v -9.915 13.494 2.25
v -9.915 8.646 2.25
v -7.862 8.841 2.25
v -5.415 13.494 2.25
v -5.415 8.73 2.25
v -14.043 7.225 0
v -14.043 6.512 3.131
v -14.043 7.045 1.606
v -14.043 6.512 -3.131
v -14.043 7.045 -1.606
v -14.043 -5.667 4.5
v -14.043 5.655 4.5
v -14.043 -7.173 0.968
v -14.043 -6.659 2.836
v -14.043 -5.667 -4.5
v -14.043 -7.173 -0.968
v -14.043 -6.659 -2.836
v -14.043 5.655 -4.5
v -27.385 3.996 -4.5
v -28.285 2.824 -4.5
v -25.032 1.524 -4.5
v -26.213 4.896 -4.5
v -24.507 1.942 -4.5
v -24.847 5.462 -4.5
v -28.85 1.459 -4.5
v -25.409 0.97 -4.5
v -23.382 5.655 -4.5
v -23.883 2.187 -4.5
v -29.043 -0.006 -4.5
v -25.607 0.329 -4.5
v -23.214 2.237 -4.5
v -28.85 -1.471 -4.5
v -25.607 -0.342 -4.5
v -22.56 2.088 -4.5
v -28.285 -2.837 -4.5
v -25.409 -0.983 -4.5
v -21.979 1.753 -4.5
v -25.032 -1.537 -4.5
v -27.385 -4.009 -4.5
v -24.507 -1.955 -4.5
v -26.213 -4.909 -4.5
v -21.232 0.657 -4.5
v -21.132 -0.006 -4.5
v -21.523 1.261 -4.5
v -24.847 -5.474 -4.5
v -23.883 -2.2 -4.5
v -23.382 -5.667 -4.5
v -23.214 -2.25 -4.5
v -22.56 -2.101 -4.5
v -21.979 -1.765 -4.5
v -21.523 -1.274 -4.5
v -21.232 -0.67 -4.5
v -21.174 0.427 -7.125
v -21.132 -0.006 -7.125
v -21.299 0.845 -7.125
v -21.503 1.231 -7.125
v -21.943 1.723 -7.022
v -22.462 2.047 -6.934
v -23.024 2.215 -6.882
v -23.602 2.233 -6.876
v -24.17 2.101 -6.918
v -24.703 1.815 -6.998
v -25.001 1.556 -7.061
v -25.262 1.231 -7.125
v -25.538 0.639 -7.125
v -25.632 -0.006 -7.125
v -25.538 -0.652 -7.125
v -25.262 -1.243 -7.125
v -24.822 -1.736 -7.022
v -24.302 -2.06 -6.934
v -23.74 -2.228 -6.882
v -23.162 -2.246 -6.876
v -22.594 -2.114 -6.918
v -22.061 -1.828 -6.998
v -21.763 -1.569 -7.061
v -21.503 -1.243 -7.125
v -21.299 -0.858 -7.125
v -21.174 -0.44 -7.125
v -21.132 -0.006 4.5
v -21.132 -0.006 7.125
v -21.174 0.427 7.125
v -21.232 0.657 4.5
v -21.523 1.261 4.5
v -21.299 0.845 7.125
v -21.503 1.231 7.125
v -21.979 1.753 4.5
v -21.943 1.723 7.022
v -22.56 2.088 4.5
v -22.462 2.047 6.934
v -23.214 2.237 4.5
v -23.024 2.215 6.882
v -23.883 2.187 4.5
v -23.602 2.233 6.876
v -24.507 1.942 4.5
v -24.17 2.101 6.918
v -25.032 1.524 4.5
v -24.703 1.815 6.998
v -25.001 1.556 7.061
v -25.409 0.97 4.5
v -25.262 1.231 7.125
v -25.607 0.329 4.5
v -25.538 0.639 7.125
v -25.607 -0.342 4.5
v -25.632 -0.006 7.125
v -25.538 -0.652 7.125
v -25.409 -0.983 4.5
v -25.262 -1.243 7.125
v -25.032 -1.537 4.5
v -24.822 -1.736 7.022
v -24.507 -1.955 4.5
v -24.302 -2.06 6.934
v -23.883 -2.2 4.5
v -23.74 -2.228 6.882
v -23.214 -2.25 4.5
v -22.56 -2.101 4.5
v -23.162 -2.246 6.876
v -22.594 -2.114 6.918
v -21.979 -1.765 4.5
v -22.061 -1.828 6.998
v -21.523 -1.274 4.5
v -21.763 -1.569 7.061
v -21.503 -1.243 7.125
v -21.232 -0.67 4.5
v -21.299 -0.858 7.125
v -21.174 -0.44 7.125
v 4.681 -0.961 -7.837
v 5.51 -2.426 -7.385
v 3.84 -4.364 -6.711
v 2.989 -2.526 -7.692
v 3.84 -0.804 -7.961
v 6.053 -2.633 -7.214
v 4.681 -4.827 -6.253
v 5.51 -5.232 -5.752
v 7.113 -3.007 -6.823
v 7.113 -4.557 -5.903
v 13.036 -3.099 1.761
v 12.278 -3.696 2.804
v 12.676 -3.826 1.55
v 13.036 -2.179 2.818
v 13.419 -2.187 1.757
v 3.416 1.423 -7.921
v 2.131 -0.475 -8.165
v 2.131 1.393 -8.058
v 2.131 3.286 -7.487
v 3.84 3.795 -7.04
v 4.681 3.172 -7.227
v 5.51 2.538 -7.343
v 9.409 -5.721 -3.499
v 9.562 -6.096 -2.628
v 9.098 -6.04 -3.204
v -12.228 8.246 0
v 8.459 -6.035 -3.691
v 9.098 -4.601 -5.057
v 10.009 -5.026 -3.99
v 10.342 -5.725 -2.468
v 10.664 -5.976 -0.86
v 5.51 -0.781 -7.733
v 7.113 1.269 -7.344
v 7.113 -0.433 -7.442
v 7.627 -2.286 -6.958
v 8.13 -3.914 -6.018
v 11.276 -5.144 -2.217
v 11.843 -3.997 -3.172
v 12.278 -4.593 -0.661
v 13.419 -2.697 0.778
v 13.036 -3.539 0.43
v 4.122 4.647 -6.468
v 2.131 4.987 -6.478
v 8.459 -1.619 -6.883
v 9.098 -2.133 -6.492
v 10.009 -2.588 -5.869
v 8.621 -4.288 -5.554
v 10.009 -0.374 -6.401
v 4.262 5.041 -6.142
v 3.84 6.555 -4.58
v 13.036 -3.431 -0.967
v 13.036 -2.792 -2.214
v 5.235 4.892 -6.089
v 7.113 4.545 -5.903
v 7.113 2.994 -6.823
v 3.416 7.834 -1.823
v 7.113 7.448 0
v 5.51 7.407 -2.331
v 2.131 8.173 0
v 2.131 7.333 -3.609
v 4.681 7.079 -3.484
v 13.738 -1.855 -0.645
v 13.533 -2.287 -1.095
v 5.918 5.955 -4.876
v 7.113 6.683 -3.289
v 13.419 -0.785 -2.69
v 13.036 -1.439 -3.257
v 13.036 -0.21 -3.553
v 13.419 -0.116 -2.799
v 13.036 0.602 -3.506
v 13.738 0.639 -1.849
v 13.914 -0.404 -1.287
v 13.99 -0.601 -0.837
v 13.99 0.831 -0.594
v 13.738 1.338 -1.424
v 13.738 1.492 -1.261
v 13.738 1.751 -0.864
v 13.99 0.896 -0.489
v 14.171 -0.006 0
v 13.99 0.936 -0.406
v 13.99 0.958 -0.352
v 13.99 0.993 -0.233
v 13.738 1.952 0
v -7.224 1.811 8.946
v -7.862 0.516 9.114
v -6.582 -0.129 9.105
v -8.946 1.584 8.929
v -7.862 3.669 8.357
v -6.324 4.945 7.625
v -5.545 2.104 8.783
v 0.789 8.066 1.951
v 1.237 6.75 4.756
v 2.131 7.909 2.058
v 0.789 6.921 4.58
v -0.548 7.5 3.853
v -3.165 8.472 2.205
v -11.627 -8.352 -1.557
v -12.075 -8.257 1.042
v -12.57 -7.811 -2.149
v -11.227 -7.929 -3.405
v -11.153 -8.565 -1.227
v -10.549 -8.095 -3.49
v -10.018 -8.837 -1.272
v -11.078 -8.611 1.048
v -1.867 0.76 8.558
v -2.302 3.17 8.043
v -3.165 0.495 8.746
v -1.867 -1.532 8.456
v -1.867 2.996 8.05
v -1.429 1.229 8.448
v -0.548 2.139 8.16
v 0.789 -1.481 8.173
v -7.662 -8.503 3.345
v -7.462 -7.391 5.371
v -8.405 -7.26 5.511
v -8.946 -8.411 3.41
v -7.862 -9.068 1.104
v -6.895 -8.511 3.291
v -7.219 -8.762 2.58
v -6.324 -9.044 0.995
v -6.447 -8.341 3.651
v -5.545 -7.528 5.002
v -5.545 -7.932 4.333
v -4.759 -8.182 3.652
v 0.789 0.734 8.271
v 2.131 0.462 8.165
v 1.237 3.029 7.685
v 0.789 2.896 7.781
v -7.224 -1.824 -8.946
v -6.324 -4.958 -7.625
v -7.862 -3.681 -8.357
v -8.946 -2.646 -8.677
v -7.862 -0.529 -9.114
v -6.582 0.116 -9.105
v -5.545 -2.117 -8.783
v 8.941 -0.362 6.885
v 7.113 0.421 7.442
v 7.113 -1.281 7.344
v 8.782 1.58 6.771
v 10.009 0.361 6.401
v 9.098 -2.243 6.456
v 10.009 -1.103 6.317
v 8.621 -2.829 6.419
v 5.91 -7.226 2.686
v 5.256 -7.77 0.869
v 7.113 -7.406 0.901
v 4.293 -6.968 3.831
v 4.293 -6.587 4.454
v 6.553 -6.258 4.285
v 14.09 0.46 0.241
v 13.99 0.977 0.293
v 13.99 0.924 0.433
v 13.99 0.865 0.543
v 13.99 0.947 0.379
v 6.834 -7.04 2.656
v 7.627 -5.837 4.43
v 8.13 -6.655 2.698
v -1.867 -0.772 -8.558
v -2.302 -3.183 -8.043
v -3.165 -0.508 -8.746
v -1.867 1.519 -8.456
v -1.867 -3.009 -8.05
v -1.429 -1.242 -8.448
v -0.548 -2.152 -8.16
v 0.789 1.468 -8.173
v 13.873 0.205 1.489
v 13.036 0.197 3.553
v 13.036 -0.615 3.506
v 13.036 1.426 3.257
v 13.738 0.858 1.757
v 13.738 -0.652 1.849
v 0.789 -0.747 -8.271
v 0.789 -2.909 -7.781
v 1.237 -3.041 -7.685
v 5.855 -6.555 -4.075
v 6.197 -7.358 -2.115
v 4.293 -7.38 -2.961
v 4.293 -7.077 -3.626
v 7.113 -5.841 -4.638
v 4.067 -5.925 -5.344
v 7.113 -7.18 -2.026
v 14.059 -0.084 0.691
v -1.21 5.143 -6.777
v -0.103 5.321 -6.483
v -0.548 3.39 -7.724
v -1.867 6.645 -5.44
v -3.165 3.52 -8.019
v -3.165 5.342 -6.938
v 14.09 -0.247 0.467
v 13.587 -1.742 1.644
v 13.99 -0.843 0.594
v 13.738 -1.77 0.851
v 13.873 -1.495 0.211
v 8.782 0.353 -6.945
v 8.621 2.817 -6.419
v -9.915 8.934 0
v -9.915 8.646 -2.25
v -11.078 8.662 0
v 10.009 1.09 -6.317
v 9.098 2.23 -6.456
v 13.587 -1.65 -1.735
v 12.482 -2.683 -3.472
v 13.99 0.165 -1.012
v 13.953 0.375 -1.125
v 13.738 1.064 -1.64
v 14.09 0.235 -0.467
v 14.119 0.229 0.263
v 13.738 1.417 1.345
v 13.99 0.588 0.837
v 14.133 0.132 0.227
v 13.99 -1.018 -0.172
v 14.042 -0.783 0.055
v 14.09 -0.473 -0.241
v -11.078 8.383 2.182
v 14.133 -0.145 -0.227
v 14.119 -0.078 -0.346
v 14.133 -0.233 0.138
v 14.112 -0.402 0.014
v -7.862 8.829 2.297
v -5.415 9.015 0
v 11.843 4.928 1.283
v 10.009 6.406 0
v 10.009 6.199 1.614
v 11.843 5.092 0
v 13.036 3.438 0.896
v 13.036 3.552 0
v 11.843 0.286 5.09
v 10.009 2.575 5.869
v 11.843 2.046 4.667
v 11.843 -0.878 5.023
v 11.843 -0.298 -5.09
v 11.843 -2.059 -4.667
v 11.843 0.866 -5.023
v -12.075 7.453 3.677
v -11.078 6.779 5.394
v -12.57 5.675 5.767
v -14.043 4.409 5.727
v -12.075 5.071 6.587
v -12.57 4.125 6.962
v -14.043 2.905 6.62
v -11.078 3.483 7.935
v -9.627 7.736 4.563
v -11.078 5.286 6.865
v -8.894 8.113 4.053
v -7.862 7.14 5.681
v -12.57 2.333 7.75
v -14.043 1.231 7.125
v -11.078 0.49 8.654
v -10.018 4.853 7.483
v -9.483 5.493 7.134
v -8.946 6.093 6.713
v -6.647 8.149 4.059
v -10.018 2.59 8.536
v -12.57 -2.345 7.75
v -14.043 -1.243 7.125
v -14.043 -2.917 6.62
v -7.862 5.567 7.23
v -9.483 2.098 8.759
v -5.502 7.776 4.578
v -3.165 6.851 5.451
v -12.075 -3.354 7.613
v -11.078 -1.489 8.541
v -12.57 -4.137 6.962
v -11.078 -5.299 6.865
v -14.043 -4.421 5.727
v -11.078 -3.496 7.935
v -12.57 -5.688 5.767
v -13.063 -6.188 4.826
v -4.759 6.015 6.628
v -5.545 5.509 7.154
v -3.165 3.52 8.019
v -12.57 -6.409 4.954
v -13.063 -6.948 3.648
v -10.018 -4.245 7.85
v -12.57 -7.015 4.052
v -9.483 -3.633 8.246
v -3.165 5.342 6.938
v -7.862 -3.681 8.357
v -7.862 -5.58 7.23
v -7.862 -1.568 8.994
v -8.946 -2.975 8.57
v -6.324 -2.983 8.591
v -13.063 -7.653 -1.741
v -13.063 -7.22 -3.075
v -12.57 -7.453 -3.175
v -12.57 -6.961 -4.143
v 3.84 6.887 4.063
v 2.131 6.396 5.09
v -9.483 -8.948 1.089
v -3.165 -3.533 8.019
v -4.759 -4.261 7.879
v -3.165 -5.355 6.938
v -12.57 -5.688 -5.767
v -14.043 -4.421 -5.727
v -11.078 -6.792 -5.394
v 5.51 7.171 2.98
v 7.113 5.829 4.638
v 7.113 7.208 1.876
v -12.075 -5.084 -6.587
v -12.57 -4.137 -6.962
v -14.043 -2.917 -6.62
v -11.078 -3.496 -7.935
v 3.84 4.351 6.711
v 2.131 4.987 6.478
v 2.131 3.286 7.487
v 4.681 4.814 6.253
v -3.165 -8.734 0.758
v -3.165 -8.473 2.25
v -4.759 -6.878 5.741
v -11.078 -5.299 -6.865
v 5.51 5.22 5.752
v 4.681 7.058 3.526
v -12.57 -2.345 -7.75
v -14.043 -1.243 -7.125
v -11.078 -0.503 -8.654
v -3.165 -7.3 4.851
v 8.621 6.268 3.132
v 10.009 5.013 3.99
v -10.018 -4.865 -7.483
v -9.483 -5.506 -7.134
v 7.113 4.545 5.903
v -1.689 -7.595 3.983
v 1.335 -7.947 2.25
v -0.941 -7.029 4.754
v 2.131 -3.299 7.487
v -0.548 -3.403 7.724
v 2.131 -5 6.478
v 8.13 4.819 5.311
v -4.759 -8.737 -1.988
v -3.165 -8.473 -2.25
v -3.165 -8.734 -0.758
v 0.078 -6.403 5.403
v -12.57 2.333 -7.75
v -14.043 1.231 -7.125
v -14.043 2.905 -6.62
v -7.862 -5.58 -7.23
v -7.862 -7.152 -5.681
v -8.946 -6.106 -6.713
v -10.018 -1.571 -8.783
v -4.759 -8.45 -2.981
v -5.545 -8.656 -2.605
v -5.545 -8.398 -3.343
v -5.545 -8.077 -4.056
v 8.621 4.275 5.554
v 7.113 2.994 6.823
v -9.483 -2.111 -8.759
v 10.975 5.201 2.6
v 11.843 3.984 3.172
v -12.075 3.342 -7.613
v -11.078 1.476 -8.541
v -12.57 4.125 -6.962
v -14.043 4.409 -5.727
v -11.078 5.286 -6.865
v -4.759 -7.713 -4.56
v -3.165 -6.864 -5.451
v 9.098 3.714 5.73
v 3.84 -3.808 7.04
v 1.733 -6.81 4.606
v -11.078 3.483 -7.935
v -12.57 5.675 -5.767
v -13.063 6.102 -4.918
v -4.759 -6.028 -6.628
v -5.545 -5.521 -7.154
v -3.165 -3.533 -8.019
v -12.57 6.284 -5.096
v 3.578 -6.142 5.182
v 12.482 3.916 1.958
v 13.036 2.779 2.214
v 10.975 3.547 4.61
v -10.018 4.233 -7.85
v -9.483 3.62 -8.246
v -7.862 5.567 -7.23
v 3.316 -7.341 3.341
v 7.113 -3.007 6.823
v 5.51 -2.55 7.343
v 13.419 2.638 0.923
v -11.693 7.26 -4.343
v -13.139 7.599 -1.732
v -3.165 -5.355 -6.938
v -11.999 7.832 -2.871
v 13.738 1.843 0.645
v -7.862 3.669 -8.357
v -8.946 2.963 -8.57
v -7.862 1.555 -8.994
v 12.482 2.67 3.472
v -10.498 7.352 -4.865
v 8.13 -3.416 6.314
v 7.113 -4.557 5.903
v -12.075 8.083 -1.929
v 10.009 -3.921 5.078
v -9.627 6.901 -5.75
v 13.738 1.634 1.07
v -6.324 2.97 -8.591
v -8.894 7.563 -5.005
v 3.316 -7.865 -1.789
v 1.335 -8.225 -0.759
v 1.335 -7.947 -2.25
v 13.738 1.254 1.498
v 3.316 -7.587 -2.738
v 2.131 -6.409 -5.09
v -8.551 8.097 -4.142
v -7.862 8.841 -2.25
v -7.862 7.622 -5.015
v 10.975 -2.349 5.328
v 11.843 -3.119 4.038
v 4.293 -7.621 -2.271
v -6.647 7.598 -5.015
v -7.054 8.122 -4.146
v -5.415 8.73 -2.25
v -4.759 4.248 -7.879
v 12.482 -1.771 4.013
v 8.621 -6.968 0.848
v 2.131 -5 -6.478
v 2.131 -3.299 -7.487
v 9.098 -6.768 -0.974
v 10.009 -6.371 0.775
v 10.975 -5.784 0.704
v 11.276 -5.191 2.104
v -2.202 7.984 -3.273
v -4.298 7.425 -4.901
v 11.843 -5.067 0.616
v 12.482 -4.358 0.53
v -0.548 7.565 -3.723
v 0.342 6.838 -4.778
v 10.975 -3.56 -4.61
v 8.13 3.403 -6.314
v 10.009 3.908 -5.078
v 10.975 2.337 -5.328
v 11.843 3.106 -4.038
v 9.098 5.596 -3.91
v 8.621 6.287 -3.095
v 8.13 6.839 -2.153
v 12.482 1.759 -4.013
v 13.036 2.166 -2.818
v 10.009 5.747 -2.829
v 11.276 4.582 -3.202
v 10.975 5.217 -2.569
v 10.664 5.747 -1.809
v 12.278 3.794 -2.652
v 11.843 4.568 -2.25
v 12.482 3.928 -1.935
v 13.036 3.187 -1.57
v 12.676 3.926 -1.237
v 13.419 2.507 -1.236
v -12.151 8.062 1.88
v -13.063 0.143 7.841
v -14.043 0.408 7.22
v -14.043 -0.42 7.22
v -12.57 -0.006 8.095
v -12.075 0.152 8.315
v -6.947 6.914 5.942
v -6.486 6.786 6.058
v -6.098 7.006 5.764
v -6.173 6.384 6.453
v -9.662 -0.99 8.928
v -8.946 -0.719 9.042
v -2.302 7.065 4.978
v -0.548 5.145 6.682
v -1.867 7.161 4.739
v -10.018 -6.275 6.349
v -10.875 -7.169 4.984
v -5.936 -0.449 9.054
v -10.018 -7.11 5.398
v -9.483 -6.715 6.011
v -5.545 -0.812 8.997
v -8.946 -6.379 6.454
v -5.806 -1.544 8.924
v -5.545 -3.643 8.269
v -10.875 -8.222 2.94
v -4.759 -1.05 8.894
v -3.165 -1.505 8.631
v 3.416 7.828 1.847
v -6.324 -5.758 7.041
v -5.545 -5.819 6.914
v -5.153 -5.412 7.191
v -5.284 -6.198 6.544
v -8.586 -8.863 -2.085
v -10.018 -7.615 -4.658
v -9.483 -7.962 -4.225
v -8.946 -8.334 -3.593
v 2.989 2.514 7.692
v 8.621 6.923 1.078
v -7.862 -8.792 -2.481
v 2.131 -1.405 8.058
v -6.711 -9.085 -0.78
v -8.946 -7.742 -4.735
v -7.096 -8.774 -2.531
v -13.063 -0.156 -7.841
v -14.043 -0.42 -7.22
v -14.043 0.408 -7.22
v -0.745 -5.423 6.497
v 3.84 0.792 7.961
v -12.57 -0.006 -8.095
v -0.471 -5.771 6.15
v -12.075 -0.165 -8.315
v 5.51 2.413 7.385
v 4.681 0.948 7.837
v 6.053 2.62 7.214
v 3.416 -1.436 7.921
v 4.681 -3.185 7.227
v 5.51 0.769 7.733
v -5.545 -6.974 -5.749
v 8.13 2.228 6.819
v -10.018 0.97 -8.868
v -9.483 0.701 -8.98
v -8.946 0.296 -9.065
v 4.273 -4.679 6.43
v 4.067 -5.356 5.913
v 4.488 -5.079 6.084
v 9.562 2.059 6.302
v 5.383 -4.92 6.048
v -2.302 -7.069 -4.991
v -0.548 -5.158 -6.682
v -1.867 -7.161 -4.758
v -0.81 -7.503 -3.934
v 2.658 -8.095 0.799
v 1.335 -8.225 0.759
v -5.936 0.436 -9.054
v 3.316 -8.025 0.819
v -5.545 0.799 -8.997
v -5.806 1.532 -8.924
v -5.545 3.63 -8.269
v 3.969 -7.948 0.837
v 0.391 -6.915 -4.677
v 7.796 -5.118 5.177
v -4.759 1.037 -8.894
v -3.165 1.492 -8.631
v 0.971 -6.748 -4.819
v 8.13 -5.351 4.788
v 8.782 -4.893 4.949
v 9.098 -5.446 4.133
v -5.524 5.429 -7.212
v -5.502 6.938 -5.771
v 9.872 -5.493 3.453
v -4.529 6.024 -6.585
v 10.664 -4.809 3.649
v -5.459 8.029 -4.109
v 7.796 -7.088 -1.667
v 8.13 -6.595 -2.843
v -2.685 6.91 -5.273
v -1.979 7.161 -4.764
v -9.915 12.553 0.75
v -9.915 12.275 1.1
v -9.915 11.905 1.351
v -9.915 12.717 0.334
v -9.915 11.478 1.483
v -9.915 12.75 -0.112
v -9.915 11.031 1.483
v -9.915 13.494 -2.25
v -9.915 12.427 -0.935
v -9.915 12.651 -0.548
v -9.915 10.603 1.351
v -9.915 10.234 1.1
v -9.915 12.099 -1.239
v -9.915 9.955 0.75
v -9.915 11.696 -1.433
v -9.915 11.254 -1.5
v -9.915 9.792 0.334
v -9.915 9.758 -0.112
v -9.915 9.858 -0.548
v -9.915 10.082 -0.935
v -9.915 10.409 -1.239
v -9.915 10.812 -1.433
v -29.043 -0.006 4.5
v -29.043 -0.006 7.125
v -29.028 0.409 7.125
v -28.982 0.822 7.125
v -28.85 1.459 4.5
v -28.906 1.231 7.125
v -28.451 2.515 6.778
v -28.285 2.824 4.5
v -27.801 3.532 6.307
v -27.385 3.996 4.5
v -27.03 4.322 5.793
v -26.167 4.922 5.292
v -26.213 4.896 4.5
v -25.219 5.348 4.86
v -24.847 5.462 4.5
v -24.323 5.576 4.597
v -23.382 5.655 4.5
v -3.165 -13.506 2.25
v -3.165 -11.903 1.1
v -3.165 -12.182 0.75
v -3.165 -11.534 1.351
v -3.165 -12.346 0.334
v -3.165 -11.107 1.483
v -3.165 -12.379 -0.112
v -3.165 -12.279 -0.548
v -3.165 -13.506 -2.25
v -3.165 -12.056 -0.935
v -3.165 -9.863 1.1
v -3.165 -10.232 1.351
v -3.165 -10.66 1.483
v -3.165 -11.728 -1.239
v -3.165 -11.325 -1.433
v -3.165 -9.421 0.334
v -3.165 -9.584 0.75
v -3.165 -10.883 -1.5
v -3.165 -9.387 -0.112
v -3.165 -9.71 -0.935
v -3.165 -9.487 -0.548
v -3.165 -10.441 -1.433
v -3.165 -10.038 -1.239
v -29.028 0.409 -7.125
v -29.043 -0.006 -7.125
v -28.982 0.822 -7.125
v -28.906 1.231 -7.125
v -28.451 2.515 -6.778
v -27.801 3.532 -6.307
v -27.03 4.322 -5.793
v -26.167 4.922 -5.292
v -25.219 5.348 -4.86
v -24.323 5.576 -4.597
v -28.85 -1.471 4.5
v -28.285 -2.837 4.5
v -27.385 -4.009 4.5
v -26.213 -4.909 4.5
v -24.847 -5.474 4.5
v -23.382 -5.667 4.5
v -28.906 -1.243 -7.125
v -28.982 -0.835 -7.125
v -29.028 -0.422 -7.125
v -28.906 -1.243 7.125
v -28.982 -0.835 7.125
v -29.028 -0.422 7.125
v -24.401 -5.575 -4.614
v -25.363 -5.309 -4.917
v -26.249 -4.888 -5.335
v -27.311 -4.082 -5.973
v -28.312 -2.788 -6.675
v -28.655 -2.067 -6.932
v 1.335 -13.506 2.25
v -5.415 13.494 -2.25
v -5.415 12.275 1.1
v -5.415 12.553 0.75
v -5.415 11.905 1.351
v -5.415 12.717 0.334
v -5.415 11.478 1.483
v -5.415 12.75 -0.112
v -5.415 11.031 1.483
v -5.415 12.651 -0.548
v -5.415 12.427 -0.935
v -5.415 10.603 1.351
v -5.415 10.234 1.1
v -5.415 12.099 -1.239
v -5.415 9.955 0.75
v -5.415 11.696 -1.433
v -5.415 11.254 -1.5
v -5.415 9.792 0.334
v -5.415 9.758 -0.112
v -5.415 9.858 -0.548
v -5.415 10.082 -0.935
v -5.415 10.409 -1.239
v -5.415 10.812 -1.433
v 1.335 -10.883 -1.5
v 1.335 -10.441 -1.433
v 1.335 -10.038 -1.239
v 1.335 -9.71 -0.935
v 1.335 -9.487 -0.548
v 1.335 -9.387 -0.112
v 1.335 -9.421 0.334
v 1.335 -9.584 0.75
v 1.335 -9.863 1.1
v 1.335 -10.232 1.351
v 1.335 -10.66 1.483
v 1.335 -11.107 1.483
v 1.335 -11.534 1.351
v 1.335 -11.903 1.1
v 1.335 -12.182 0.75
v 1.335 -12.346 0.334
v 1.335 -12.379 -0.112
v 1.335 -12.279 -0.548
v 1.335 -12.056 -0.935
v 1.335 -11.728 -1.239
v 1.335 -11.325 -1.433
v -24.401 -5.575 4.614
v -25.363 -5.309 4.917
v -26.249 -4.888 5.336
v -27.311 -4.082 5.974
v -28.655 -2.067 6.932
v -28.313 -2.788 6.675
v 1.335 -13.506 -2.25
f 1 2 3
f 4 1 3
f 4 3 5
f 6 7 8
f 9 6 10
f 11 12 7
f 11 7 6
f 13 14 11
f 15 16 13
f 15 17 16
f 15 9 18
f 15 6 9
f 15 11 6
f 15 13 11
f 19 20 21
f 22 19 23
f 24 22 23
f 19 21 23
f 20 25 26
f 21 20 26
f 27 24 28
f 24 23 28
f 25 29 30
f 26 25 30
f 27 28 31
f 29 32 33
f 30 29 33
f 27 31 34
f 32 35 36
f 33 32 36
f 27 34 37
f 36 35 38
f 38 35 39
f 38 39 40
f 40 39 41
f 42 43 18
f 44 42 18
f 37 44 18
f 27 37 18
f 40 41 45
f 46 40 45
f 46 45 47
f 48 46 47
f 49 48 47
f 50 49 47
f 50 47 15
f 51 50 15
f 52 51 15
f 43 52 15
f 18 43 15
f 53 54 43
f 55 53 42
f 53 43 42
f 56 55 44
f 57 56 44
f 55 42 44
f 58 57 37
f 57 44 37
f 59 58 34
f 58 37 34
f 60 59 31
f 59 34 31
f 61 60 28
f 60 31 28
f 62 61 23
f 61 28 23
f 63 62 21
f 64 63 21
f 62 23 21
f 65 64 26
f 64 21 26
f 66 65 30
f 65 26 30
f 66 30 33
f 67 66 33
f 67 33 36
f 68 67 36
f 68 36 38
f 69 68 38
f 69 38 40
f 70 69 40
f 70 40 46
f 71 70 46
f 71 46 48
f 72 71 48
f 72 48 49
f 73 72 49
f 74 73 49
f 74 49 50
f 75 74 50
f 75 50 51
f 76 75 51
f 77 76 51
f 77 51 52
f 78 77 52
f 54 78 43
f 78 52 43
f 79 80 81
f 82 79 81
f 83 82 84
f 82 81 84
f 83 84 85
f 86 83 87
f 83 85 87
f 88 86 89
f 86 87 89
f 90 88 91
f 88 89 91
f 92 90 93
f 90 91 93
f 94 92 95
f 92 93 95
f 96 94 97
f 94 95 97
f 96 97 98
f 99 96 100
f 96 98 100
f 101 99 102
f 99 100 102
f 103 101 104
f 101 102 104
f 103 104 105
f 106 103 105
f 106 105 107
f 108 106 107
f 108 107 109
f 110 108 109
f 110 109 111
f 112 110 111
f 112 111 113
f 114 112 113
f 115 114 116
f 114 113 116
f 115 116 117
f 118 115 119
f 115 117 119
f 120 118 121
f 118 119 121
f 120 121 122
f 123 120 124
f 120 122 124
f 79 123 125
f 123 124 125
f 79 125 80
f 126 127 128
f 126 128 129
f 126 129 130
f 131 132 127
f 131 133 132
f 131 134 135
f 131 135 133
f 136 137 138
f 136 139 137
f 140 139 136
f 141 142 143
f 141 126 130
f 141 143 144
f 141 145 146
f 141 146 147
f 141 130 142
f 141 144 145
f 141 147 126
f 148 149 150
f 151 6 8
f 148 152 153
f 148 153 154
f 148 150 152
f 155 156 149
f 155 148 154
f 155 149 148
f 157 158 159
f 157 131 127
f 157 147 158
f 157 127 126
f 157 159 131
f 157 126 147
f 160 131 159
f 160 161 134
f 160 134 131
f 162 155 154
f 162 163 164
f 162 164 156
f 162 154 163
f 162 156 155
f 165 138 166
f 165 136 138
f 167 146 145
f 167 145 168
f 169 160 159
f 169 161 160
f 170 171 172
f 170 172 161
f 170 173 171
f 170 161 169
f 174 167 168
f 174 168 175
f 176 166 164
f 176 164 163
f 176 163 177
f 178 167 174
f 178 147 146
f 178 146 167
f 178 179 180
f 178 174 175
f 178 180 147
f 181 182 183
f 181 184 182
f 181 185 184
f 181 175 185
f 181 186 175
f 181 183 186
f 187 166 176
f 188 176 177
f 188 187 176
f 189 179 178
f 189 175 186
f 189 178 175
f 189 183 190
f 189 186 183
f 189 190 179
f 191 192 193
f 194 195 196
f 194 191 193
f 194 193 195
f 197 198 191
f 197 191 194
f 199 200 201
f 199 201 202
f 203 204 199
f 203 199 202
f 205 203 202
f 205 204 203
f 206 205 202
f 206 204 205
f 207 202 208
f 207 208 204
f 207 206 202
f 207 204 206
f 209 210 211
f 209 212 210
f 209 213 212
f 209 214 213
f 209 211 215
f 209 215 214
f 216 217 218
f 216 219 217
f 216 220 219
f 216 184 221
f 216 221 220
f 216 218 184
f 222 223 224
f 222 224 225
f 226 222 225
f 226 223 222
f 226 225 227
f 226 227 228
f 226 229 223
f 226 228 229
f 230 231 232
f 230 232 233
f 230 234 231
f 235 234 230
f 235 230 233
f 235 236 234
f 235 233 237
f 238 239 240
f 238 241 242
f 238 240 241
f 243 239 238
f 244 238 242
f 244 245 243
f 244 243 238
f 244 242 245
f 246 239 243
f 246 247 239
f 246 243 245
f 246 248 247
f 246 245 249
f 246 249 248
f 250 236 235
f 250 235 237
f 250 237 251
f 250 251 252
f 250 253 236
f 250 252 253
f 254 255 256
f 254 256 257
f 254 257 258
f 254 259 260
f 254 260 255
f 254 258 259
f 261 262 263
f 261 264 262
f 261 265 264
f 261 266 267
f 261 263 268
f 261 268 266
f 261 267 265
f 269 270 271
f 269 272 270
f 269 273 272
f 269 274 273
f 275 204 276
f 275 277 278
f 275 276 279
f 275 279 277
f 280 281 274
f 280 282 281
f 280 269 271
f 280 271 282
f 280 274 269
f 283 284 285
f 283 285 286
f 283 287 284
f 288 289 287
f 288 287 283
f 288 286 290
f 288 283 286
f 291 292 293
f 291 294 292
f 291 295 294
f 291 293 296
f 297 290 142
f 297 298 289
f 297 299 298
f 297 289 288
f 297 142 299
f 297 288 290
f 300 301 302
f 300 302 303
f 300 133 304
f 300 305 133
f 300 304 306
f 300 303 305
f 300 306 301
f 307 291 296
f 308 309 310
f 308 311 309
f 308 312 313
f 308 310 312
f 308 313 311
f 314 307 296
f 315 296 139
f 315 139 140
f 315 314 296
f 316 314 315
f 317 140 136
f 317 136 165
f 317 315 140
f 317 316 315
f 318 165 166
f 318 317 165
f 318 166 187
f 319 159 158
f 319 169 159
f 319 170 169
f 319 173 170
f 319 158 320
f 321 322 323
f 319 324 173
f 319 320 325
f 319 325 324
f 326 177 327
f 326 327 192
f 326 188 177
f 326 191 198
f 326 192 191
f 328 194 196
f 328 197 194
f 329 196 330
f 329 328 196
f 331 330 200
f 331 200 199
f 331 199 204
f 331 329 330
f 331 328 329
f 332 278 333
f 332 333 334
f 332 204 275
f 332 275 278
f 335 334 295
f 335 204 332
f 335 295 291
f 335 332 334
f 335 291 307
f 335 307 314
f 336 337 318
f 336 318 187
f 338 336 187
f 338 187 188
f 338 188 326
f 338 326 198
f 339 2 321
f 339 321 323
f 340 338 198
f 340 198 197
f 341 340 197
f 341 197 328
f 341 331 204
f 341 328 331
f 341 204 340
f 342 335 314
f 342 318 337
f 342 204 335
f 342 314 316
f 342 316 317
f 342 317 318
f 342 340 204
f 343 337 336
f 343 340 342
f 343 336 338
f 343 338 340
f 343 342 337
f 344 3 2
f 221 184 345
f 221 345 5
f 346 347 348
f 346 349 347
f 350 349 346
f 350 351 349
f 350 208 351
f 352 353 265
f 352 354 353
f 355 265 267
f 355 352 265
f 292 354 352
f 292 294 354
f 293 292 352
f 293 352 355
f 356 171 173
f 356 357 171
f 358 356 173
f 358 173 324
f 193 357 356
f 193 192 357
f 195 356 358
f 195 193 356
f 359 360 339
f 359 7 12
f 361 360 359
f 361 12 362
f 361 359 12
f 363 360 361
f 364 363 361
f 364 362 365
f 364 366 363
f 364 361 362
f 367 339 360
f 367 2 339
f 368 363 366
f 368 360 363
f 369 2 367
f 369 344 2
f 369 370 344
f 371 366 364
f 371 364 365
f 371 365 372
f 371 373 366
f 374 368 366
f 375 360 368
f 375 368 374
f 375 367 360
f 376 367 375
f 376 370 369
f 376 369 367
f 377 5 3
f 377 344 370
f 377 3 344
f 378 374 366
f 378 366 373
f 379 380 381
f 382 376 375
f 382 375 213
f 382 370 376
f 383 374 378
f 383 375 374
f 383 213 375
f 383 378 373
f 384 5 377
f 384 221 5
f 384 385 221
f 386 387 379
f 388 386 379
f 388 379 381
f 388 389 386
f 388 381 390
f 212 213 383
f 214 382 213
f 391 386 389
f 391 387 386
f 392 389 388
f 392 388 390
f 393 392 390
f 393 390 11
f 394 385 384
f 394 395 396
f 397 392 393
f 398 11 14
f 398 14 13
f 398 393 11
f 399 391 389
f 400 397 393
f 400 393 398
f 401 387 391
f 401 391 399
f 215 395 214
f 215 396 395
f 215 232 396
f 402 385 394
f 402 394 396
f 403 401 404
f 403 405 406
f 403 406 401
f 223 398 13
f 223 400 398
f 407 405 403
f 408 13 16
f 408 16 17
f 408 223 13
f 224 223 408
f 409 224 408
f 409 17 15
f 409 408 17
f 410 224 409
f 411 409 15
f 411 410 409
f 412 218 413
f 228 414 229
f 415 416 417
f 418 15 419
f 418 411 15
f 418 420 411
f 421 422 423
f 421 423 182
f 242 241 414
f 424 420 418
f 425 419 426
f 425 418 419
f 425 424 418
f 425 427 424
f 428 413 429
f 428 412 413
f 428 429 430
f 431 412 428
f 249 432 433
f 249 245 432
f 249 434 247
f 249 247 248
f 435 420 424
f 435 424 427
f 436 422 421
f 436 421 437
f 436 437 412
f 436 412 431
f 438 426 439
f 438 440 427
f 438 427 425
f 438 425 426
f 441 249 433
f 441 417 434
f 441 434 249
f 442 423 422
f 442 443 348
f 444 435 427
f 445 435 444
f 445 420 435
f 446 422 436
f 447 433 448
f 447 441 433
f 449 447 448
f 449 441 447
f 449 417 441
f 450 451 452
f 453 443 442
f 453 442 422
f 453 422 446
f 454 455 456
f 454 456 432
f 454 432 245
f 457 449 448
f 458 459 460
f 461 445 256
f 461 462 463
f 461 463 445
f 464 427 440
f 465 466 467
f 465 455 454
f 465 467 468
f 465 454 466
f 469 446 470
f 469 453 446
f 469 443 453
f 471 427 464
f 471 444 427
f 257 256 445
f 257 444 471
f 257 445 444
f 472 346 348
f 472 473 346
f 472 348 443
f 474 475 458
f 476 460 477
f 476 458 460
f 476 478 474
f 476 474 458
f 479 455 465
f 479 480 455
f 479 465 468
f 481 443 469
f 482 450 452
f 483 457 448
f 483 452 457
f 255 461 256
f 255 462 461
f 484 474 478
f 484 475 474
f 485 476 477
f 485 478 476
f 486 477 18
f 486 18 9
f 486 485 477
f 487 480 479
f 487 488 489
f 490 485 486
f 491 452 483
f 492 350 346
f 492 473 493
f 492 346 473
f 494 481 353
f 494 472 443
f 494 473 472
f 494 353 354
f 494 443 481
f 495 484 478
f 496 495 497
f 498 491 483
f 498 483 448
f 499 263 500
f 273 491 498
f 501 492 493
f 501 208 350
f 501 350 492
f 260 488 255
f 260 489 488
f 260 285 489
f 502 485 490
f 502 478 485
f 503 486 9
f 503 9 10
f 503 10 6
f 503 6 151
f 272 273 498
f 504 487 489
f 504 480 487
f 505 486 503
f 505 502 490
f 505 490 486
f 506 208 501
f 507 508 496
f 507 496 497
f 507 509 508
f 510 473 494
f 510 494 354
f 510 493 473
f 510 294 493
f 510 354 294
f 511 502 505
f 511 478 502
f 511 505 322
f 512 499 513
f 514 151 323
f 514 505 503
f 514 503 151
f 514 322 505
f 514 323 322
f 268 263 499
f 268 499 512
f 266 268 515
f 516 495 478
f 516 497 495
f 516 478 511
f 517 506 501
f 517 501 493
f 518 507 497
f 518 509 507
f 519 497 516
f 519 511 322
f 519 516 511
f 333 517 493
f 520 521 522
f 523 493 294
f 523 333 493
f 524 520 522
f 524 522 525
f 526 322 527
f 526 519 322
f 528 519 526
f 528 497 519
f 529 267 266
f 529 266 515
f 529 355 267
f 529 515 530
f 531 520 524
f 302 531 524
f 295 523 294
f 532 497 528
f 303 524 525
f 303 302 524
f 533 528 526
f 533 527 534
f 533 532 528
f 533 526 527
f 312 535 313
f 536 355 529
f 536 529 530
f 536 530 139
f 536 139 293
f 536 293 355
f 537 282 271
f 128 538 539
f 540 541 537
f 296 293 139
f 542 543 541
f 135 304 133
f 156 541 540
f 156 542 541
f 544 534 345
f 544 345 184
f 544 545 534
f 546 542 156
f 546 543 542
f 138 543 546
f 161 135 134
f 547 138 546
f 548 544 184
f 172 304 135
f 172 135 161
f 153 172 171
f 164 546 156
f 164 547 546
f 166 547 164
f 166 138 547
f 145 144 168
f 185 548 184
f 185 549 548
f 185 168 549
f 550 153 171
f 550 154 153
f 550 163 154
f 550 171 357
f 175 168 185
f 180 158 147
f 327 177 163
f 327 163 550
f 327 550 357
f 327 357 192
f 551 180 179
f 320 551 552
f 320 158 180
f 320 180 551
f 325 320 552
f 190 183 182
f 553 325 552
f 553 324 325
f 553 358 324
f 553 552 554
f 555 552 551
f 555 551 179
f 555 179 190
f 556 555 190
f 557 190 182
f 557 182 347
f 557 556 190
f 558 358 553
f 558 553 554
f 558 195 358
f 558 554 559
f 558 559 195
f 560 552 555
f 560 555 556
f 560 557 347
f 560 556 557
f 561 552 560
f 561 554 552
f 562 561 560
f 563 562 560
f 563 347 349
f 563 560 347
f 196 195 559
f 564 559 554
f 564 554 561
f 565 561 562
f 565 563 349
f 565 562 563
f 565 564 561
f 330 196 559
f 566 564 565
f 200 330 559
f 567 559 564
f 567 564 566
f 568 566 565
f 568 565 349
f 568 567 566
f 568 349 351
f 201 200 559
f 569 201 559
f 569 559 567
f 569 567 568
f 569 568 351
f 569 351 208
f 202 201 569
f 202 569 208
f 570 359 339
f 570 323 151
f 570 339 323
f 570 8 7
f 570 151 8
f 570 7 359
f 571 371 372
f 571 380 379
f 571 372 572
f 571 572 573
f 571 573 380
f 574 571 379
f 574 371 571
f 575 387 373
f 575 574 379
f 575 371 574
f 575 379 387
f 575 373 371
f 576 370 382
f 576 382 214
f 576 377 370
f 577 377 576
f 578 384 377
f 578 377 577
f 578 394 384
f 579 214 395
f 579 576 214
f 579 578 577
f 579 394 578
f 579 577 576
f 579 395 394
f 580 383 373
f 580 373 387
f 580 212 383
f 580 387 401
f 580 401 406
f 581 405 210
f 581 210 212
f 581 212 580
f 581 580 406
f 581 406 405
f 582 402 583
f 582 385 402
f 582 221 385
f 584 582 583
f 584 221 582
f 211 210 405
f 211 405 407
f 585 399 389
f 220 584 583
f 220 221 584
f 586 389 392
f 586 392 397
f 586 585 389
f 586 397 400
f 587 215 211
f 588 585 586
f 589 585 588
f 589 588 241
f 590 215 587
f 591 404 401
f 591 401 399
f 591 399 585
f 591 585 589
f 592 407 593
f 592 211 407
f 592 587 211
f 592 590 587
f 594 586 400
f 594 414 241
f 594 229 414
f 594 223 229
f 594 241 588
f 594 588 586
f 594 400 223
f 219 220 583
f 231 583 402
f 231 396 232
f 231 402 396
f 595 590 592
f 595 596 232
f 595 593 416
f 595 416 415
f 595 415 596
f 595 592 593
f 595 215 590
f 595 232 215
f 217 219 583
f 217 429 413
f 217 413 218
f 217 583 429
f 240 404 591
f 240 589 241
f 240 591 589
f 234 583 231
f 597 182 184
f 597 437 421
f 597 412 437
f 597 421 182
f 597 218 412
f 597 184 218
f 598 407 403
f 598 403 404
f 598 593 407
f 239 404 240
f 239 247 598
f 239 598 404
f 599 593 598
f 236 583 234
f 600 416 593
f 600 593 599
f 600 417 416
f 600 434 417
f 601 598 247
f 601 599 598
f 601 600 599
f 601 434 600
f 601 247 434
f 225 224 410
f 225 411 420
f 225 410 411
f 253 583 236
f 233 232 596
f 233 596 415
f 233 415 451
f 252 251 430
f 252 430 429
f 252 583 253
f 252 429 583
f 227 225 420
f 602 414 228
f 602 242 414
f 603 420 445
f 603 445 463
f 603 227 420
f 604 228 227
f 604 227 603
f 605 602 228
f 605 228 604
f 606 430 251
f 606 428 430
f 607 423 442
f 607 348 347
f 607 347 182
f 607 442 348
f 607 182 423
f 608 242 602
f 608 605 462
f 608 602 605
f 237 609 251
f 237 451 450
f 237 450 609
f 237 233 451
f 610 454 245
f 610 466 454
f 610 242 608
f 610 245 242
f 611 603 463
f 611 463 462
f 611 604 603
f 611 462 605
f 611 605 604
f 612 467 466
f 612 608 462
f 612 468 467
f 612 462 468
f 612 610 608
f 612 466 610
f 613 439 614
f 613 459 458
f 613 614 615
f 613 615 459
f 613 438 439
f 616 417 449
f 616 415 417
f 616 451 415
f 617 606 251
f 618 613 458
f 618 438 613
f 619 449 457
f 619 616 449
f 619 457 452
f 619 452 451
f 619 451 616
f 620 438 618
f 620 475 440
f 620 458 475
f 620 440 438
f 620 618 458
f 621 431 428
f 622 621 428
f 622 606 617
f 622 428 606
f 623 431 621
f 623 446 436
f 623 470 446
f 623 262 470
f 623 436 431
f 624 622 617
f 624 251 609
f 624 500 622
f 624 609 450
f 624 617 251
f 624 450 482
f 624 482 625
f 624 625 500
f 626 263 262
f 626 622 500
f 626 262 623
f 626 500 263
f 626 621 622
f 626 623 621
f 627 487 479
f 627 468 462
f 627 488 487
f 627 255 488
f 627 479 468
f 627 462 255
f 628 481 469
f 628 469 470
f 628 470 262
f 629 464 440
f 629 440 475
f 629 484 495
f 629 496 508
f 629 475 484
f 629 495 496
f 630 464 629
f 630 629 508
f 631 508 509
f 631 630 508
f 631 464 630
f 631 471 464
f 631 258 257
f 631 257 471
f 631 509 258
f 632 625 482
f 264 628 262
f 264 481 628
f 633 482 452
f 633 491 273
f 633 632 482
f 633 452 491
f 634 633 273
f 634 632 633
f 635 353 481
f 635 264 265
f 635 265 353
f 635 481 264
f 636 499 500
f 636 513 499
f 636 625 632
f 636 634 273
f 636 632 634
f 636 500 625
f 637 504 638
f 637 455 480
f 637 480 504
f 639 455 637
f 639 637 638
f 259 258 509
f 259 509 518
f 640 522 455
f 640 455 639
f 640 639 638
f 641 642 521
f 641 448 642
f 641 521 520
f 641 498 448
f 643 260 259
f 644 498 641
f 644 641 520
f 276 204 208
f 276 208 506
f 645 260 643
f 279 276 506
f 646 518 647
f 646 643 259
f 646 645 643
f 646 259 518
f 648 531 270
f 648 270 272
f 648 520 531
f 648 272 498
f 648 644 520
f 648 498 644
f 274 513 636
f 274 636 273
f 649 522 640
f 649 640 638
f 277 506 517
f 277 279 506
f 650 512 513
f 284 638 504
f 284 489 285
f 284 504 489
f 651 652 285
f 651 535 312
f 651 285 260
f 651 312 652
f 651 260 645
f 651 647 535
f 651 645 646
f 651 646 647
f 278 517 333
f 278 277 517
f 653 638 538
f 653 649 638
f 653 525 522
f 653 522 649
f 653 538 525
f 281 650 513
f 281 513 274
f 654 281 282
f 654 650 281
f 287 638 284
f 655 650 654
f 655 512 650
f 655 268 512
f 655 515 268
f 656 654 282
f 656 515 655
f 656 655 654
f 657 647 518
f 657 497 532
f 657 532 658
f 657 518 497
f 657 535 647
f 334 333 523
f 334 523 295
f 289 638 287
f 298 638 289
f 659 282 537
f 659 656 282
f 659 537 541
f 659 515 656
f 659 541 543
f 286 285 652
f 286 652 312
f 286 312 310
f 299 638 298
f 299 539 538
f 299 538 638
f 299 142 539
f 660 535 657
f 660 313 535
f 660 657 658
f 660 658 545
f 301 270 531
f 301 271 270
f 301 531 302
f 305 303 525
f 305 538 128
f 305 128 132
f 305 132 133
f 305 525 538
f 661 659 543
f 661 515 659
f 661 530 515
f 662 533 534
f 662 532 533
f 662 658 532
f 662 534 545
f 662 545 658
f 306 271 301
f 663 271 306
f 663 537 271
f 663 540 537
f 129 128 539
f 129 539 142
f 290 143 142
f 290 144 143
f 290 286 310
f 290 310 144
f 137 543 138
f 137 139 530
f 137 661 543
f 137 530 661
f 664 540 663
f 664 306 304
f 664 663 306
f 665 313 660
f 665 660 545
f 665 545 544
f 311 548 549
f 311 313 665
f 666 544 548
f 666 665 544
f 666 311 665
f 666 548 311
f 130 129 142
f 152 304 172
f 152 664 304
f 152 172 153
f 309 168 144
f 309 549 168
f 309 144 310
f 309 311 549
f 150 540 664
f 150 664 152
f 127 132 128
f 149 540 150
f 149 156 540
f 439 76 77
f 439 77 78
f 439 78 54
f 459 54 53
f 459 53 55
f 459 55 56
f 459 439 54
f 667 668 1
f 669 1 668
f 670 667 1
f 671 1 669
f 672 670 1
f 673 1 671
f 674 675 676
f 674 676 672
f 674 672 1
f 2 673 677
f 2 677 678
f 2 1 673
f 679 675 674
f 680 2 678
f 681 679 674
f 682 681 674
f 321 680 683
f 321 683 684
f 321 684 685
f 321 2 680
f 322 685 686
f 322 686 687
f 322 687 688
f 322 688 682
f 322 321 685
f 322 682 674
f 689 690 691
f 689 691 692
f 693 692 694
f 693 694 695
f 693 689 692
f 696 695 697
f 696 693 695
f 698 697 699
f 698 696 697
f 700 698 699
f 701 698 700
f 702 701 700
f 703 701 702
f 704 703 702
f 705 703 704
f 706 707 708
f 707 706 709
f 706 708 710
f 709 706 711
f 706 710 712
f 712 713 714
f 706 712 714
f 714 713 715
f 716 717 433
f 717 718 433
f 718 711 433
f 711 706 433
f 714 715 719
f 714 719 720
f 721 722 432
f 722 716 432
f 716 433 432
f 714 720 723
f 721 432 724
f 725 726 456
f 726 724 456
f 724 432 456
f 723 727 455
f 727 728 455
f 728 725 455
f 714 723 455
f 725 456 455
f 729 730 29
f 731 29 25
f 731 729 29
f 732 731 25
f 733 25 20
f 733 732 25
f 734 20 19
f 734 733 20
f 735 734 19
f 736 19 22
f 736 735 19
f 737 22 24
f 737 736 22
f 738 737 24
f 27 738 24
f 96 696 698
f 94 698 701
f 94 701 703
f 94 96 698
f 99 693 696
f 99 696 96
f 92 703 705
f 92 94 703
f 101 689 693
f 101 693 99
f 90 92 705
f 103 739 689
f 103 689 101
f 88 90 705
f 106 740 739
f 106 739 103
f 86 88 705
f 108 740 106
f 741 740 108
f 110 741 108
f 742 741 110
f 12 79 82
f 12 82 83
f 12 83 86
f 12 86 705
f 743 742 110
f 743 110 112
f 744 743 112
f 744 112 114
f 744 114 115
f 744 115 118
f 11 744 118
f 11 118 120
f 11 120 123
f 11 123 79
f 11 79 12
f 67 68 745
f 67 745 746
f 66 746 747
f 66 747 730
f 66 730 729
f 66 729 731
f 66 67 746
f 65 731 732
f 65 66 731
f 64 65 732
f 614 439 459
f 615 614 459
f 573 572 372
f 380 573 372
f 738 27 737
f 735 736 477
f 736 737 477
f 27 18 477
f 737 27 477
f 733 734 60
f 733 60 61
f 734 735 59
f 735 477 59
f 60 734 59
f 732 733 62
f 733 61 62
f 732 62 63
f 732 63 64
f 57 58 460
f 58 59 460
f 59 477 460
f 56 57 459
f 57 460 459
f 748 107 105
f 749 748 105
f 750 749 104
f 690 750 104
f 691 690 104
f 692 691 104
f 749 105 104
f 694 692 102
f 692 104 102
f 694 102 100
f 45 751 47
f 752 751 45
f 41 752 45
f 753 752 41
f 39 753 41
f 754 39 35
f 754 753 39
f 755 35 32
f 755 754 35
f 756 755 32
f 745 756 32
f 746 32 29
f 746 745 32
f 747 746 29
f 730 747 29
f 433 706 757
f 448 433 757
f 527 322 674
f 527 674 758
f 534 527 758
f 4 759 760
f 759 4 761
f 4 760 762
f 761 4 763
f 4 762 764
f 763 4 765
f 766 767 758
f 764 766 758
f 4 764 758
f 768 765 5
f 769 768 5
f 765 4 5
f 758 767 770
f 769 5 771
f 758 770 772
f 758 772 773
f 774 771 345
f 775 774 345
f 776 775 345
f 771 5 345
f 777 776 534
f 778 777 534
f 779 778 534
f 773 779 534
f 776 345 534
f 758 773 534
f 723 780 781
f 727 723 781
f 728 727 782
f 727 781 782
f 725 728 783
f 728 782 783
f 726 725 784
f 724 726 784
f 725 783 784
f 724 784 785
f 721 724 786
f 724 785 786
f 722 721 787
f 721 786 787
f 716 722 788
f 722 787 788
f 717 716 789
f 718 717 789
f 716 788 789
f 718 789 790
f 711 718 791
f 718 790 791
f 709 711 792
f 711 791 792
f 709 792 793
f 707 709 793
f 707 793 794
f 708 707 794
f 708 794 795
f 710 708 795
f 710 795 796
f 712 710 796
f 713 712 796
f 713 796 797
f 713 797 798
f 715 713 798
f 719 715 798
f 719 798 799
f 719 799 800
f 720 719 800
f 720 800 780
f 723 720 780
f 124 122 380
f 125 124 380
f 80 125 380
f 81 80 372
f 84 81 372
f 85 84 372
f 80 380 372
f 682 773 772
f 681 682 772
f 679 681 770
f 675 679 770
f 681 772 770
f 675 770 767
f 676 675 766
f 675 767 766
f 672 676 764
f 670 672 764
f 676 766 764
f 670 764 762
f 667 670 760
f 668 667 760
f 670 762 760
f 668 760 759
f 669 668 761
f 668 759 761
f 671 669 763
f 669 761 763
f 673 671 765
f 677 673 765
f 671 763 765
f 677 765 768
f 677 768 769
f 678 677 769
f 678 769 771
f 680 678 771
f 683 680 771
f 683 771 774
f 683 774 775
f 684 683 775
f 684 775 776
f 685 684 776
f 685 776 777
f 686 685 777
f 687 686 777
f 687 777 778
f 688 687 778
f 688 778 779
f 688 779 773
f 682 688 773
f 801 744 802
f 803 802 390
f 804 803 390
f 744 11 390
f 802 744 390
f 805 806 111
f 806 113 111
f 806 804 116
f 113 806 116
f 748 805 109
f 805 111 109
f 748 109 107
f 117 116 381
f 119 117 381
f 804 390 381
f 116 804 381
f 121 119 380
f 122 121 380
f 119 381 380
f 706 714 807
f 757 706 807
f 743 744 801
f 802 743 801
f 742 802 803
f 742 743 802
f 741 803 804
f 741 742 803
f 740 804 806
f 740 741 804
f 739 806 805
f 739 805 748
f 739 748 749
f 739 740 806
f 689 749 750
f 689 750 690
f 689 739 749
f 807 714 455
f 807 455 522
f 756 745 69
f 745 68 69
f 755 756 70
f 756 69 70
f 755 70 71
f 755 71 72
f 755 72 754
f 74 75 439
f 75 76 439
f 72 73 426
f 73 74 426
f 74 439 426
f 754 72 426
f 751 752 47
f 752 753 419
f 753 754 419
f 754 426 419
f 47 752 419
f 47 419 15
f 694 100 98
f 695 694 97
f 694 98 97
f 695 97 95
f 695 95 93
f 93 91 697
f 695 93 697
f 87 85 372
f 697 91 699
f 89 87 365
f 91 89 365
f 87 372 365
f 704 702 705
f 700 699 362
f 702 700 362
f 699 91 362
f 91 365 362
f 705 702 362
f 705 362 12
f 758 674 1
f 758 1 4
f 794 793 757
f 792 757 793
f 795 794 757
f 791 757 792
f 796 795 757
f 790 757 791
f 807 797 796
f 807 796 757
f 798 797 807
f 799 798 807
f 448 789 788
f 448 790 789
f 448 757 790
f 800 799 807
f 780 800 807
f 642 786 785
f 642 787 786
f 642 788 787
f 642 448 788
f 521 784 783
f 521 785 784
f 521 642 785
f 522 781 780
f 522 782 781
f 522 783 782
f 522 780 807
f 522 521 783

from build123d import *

# Parameters (mm, degrees)
SKETCH2_W               = 19
SKETCH2_H               = 20
BOSS_EXTRUDE1_DEPTH     = 20
SKETCH3_R               = 15
SKETCH3_R_2             = 9.642090149
CUT_EXTRUDE1_DEPTH      = 42.372377867
CUT_EXTRUDE2_DEPTH      = 42.267785166
CUT_EXTRUDE2_DEPTH_BACK = 42.267785166
SKETCH4_W               = 20
SKETCH4_H               = 12
CUT_EXTRUDE3_DEPTH      = 44.418151428
CUT_EXTRUDE3_DEPTH_BACK = 44.418151428
SKETCH7_R               = 3
CUT_EXTRUDE4_DEPTH      = 45.995713719
SKETCH8_W               = 6
SKETCH8_H               = 6
BOSS_EXTRUDE3_DEPTH     = 18
SKETCH9_R               = 2
CUT_EXTRUDE5_DEPTH      = 16
SKETCH10_W              = 6
SKETCH10_H              = 6
BOSS_EXTRUDE4_DEPTH     = 18
SKETCH11_R              = 2
CUT_EXTRUDE6_DEPTH      = 39.271928202
SCALE1_SCALE            = 0.75


with BuildPart() as part:
    # Sketch1 → Revolve1 (revolve)
    with BuildSketch(Plane.XY):
        with BuildLine():
            Line((-17.503938211, 9.642090149), (-17.503938211, 0))
            Line((-17.503938211, 0), (20.115058741, 0))
            add(Edge.make_bspline(
                [(-17.503938211, 9.642090149), (-12.037965172, 13.468024809), (1.720669261, 9.986942396), (18.674857326, 10.7604322), (20.115058741, 0)],
                knots=[0, 0, 0, 0, 0.417251545, 1, 1, 1, 1], degree=3))
        make_face()
    revolve(axis=Axis((-34.275157211, 0, 0), (1, 0, 0)))

    # Sketch2 → Boss-Extrude1 (add)
    with BuildSketch(Plane.ZY.offset(17.503938211)):
        Rectangle(SKETCH2_W, SKETCH2_H)
    extrude(amount=BOSS_EXTRUDE1_DEPTH)

    # Sketch3 → Cut-Extrude1 (cut, through all)
    with BuildSketch(Plane.ZY.offset(17.503938211)):
        Circle(SKETCH3_R)
        Circle(SKETCH3_R_2, mode=Mode.SUBTRACT)
    extrude(amount=CUT_EXTRUDE1_DEPTH, mode=Mode.SUBTRACT)

    # Sketch4 → Cut-Extrude2 (cut, two sides: drawn at the far end of the back side and taken through both)
    with BuildSketch(Plane(origin=(0, 0, 0), x_dir=(1, 0, 0), z_dir=(0, 1, 0)).offset(-CUT_EXTRUDE2_DEPTH_BACK)):
        with Locations((-27.503938211, 0)):
            Rectangle(SKETCH4_W, SKETCH4_H)
    extrude(amount=CUT_EXTRUDE2_DEPTH + CUT_EXTRUDE2_DEPTH_BACK, mode=Mode.SUBTRACT)

    # Sketch6 → Cut-Extrude3 (cut, two sides: drawn at the far end of the back side and taken through both)
    with BuildSketch(Plane.XY.offset(-6).offset(-CUT_EXTRUDE3_DEPTH_BACK)):
        with BuildLine():
            Line((-37.503938211, -7.547840913), (-29.956097298, -7.547840913))
            ThreePointArc((-29.956097298, -7.547840913), (-35.293226791, -5.337129493), (-37.503938211, 0))
            Line((-37.503938211, 0), (-37.503938211, -7.547840913))
        make_face()
        with BuildLine():
            Line((-37.503938211, 7.547840913), (-37.503938211, 0))
            ThreePointArc((-37.503938211, 0), (-35.293226791, 5.337129493), (-29.956097298, 7.547840913))
            Line((-29.956097298, 7.547840913), (-37.503938211, 7.547840913))
        make_face()
    extrude(amount=CUT_EXTRUDE3_DEPTH + CUT_EXTRUDE3_DEPTH_BACK, mode=Mode.SUBTRACT)

    # Sketch7 → Cut-Extrude4 (cut, through all)
    with BuildSketch(Plane.XY.offset(9.5)):
        with Locations((-29.956097298, 0)):
            Circle(SKETCH7_R)
    extrude(amount=-CUT_EXTRUDE4_DEPTH, mode=Mode.SUBTRACT)

    # Sketch8 → Boss-Extrude3 (add)
    with BuildSketch(Plane(origin=(0, 0, 0), x_dir=(1, 0, 0), z_dir=(0, 1, 0))):
        Rectangle(SKETCH8_W, SKETCH8_H)
    extrude(amount=-BOSS_EXTRUDE3_DEPTH)

    # Sketch9 → Cut-Extrude5 (cut)
    with BuildSketch(Plane(origin=(3, 0, 0), x_dir=(0, 0, -1), z_dir=(1, 0, 0))):
        with Locations((0, -14.50236021)):
            Circle(SKETCH9_R)
    extrude(amount=-CUT_EXTRUDE5_DEPTH, mode=Mode.SUBTRACT)

    # Sketch10 → Boss-Extrude4 (add)
    with BuildSketch(Plane(origin=(0, 0, 0), x_dir=(1, 0, 0), z_dir=(0, 1, 0))):
        with Locations((-9, 0)):
            Rectangle(SKETCH10_W, SKETCH10_H)
    extrude(amount=BOSS_EXTRUDE4_DEPTH)

    # Sketch11 → Cut-Extrude6 (cut, through all)
    with BuildSketch(Plane(origin=(-6, 0, 0), x_dir=(0, 0, -1), z_dir=(1, 0, 0))):
        with Locations((0, 15.01416918)):
            Circle(SKETCH11_R)
    extrude(amount=-CUT_EXTRUDE6_DEPTH, mode=Mode.SUBTRACT)


with BuildPart() as part_1:
    # Scale1: scaled about (-3.660408947, -0.025369867, 3.84e-07)
    add(part.part.scale(SCALE1_SCALE).moved(Location((-0.915102237, -0.006342467, 9.6e-08))))


solid = part_1.part
